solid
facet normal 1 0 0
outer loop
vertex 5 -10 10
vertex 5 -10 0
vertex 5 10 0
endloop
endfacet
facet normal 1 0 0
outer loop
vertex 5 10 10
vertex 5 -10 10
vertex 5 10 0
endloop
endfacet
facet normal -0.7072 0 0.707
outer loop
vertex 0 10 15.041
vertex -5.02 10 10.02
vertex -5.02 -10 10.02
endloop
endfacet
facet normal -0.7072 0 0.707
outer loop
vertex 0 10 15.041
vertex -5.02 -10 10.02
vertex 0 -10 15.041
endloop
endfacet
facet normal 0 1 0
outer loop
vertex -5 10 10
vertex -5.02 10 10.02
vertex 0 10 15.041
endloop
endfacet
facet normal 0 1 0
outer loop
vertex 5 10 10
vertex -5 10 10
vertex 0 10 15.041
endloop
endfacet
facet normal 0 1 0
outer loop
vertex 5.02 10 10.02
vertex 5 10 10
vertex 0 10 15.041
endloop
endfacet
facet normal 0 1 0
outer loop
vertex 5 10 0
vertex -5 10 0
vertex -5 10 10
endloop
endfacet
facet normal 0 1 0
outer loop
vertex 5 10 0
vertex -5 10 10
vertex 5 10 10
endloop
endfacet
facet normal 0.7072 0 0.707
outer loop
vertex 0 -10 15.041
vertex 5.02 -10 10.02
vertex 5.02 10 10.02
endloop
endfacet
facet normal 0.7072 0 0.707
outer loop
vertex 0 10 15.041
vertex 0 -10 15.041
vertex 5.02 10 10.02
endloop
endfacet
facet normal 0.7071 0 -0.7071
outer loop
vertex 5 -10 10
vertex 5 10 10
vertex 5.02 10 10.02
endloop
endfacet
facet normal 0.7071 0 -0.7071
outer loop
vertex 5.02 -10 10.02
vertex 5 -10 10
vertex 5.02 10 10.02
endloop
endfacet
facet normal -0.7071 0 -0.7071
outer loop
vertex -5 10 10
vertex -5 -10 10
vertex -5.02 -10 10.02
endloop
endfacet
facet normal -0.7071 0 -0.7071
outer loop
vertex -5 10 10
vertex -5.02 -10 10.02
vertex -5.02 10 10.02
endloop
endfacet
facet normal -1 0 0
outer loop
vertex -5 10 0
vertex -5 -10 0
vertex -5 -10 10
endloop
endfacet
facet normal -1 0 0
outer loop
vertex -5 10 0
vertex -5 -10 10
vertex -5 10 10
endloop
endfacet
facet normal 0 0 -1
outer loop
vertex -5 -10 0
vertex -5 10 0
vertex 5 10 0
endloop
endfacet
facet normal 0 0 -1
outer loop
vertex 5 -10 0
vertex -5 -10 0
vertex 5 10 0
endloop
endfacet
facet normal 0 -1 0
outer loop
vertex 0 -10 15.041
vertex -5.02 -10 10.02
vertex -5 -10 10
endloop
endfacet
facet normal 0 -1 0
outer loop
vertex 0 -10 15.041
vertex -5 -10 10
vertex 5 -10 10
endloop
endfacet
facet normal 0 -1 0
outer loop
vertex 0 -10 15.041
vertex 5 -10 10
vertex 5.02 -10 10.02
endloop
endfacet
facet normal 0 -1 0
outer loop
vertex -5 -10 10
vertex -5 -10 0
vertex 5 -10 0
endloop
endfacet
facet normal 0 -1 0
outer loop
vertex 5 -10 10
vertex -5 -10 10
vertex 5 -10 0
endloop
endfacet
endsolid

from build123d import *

# Parameters (mm, degrees)
BOX001_W               = 7.1
BOX001_H               = 20
BOX001_DEPTH           = 7.1
BOX001_PLACEMENT_ANGLE = 45
BOX_W                  = 10
BOX_H                  = 20
BOX_DEPTH              = 10


with BuildPart() as teulada:
    # Box001 → Box001 (new body)
    with BuildSketch(Plane.XY):
        with Locations((3.55, 10)):
            Rectangle(BOX001_W, BOX001_H)
    extrude(amount=BOX001_DEPTH)


with BuildPart() as teulada_1:
    # Box001 placement: moved
    add(teulada.part.moved(Location((5, 0, 5))).rotate(Axis((5, 0, 5), (0, -1, 0)), BOX001_PLACEMENT_ANGLE))


with BuildPart() as fusion:
    # Box → Box (new body)
    with BuildSketch(Plane.XY):
        with Locations((5, 10)):
            Rectangle(BOX_W, BOX_H)
    extrude(amount=BOX_DEPTH)

    # Fusion: union teulada
    add(teulada_1.part)


with BuildPart() as fusion_1:
    # Fusion placement: moved
    add(fusion.part.moved(Location((-5, -10, 0))))


solid = fusion_1.part
